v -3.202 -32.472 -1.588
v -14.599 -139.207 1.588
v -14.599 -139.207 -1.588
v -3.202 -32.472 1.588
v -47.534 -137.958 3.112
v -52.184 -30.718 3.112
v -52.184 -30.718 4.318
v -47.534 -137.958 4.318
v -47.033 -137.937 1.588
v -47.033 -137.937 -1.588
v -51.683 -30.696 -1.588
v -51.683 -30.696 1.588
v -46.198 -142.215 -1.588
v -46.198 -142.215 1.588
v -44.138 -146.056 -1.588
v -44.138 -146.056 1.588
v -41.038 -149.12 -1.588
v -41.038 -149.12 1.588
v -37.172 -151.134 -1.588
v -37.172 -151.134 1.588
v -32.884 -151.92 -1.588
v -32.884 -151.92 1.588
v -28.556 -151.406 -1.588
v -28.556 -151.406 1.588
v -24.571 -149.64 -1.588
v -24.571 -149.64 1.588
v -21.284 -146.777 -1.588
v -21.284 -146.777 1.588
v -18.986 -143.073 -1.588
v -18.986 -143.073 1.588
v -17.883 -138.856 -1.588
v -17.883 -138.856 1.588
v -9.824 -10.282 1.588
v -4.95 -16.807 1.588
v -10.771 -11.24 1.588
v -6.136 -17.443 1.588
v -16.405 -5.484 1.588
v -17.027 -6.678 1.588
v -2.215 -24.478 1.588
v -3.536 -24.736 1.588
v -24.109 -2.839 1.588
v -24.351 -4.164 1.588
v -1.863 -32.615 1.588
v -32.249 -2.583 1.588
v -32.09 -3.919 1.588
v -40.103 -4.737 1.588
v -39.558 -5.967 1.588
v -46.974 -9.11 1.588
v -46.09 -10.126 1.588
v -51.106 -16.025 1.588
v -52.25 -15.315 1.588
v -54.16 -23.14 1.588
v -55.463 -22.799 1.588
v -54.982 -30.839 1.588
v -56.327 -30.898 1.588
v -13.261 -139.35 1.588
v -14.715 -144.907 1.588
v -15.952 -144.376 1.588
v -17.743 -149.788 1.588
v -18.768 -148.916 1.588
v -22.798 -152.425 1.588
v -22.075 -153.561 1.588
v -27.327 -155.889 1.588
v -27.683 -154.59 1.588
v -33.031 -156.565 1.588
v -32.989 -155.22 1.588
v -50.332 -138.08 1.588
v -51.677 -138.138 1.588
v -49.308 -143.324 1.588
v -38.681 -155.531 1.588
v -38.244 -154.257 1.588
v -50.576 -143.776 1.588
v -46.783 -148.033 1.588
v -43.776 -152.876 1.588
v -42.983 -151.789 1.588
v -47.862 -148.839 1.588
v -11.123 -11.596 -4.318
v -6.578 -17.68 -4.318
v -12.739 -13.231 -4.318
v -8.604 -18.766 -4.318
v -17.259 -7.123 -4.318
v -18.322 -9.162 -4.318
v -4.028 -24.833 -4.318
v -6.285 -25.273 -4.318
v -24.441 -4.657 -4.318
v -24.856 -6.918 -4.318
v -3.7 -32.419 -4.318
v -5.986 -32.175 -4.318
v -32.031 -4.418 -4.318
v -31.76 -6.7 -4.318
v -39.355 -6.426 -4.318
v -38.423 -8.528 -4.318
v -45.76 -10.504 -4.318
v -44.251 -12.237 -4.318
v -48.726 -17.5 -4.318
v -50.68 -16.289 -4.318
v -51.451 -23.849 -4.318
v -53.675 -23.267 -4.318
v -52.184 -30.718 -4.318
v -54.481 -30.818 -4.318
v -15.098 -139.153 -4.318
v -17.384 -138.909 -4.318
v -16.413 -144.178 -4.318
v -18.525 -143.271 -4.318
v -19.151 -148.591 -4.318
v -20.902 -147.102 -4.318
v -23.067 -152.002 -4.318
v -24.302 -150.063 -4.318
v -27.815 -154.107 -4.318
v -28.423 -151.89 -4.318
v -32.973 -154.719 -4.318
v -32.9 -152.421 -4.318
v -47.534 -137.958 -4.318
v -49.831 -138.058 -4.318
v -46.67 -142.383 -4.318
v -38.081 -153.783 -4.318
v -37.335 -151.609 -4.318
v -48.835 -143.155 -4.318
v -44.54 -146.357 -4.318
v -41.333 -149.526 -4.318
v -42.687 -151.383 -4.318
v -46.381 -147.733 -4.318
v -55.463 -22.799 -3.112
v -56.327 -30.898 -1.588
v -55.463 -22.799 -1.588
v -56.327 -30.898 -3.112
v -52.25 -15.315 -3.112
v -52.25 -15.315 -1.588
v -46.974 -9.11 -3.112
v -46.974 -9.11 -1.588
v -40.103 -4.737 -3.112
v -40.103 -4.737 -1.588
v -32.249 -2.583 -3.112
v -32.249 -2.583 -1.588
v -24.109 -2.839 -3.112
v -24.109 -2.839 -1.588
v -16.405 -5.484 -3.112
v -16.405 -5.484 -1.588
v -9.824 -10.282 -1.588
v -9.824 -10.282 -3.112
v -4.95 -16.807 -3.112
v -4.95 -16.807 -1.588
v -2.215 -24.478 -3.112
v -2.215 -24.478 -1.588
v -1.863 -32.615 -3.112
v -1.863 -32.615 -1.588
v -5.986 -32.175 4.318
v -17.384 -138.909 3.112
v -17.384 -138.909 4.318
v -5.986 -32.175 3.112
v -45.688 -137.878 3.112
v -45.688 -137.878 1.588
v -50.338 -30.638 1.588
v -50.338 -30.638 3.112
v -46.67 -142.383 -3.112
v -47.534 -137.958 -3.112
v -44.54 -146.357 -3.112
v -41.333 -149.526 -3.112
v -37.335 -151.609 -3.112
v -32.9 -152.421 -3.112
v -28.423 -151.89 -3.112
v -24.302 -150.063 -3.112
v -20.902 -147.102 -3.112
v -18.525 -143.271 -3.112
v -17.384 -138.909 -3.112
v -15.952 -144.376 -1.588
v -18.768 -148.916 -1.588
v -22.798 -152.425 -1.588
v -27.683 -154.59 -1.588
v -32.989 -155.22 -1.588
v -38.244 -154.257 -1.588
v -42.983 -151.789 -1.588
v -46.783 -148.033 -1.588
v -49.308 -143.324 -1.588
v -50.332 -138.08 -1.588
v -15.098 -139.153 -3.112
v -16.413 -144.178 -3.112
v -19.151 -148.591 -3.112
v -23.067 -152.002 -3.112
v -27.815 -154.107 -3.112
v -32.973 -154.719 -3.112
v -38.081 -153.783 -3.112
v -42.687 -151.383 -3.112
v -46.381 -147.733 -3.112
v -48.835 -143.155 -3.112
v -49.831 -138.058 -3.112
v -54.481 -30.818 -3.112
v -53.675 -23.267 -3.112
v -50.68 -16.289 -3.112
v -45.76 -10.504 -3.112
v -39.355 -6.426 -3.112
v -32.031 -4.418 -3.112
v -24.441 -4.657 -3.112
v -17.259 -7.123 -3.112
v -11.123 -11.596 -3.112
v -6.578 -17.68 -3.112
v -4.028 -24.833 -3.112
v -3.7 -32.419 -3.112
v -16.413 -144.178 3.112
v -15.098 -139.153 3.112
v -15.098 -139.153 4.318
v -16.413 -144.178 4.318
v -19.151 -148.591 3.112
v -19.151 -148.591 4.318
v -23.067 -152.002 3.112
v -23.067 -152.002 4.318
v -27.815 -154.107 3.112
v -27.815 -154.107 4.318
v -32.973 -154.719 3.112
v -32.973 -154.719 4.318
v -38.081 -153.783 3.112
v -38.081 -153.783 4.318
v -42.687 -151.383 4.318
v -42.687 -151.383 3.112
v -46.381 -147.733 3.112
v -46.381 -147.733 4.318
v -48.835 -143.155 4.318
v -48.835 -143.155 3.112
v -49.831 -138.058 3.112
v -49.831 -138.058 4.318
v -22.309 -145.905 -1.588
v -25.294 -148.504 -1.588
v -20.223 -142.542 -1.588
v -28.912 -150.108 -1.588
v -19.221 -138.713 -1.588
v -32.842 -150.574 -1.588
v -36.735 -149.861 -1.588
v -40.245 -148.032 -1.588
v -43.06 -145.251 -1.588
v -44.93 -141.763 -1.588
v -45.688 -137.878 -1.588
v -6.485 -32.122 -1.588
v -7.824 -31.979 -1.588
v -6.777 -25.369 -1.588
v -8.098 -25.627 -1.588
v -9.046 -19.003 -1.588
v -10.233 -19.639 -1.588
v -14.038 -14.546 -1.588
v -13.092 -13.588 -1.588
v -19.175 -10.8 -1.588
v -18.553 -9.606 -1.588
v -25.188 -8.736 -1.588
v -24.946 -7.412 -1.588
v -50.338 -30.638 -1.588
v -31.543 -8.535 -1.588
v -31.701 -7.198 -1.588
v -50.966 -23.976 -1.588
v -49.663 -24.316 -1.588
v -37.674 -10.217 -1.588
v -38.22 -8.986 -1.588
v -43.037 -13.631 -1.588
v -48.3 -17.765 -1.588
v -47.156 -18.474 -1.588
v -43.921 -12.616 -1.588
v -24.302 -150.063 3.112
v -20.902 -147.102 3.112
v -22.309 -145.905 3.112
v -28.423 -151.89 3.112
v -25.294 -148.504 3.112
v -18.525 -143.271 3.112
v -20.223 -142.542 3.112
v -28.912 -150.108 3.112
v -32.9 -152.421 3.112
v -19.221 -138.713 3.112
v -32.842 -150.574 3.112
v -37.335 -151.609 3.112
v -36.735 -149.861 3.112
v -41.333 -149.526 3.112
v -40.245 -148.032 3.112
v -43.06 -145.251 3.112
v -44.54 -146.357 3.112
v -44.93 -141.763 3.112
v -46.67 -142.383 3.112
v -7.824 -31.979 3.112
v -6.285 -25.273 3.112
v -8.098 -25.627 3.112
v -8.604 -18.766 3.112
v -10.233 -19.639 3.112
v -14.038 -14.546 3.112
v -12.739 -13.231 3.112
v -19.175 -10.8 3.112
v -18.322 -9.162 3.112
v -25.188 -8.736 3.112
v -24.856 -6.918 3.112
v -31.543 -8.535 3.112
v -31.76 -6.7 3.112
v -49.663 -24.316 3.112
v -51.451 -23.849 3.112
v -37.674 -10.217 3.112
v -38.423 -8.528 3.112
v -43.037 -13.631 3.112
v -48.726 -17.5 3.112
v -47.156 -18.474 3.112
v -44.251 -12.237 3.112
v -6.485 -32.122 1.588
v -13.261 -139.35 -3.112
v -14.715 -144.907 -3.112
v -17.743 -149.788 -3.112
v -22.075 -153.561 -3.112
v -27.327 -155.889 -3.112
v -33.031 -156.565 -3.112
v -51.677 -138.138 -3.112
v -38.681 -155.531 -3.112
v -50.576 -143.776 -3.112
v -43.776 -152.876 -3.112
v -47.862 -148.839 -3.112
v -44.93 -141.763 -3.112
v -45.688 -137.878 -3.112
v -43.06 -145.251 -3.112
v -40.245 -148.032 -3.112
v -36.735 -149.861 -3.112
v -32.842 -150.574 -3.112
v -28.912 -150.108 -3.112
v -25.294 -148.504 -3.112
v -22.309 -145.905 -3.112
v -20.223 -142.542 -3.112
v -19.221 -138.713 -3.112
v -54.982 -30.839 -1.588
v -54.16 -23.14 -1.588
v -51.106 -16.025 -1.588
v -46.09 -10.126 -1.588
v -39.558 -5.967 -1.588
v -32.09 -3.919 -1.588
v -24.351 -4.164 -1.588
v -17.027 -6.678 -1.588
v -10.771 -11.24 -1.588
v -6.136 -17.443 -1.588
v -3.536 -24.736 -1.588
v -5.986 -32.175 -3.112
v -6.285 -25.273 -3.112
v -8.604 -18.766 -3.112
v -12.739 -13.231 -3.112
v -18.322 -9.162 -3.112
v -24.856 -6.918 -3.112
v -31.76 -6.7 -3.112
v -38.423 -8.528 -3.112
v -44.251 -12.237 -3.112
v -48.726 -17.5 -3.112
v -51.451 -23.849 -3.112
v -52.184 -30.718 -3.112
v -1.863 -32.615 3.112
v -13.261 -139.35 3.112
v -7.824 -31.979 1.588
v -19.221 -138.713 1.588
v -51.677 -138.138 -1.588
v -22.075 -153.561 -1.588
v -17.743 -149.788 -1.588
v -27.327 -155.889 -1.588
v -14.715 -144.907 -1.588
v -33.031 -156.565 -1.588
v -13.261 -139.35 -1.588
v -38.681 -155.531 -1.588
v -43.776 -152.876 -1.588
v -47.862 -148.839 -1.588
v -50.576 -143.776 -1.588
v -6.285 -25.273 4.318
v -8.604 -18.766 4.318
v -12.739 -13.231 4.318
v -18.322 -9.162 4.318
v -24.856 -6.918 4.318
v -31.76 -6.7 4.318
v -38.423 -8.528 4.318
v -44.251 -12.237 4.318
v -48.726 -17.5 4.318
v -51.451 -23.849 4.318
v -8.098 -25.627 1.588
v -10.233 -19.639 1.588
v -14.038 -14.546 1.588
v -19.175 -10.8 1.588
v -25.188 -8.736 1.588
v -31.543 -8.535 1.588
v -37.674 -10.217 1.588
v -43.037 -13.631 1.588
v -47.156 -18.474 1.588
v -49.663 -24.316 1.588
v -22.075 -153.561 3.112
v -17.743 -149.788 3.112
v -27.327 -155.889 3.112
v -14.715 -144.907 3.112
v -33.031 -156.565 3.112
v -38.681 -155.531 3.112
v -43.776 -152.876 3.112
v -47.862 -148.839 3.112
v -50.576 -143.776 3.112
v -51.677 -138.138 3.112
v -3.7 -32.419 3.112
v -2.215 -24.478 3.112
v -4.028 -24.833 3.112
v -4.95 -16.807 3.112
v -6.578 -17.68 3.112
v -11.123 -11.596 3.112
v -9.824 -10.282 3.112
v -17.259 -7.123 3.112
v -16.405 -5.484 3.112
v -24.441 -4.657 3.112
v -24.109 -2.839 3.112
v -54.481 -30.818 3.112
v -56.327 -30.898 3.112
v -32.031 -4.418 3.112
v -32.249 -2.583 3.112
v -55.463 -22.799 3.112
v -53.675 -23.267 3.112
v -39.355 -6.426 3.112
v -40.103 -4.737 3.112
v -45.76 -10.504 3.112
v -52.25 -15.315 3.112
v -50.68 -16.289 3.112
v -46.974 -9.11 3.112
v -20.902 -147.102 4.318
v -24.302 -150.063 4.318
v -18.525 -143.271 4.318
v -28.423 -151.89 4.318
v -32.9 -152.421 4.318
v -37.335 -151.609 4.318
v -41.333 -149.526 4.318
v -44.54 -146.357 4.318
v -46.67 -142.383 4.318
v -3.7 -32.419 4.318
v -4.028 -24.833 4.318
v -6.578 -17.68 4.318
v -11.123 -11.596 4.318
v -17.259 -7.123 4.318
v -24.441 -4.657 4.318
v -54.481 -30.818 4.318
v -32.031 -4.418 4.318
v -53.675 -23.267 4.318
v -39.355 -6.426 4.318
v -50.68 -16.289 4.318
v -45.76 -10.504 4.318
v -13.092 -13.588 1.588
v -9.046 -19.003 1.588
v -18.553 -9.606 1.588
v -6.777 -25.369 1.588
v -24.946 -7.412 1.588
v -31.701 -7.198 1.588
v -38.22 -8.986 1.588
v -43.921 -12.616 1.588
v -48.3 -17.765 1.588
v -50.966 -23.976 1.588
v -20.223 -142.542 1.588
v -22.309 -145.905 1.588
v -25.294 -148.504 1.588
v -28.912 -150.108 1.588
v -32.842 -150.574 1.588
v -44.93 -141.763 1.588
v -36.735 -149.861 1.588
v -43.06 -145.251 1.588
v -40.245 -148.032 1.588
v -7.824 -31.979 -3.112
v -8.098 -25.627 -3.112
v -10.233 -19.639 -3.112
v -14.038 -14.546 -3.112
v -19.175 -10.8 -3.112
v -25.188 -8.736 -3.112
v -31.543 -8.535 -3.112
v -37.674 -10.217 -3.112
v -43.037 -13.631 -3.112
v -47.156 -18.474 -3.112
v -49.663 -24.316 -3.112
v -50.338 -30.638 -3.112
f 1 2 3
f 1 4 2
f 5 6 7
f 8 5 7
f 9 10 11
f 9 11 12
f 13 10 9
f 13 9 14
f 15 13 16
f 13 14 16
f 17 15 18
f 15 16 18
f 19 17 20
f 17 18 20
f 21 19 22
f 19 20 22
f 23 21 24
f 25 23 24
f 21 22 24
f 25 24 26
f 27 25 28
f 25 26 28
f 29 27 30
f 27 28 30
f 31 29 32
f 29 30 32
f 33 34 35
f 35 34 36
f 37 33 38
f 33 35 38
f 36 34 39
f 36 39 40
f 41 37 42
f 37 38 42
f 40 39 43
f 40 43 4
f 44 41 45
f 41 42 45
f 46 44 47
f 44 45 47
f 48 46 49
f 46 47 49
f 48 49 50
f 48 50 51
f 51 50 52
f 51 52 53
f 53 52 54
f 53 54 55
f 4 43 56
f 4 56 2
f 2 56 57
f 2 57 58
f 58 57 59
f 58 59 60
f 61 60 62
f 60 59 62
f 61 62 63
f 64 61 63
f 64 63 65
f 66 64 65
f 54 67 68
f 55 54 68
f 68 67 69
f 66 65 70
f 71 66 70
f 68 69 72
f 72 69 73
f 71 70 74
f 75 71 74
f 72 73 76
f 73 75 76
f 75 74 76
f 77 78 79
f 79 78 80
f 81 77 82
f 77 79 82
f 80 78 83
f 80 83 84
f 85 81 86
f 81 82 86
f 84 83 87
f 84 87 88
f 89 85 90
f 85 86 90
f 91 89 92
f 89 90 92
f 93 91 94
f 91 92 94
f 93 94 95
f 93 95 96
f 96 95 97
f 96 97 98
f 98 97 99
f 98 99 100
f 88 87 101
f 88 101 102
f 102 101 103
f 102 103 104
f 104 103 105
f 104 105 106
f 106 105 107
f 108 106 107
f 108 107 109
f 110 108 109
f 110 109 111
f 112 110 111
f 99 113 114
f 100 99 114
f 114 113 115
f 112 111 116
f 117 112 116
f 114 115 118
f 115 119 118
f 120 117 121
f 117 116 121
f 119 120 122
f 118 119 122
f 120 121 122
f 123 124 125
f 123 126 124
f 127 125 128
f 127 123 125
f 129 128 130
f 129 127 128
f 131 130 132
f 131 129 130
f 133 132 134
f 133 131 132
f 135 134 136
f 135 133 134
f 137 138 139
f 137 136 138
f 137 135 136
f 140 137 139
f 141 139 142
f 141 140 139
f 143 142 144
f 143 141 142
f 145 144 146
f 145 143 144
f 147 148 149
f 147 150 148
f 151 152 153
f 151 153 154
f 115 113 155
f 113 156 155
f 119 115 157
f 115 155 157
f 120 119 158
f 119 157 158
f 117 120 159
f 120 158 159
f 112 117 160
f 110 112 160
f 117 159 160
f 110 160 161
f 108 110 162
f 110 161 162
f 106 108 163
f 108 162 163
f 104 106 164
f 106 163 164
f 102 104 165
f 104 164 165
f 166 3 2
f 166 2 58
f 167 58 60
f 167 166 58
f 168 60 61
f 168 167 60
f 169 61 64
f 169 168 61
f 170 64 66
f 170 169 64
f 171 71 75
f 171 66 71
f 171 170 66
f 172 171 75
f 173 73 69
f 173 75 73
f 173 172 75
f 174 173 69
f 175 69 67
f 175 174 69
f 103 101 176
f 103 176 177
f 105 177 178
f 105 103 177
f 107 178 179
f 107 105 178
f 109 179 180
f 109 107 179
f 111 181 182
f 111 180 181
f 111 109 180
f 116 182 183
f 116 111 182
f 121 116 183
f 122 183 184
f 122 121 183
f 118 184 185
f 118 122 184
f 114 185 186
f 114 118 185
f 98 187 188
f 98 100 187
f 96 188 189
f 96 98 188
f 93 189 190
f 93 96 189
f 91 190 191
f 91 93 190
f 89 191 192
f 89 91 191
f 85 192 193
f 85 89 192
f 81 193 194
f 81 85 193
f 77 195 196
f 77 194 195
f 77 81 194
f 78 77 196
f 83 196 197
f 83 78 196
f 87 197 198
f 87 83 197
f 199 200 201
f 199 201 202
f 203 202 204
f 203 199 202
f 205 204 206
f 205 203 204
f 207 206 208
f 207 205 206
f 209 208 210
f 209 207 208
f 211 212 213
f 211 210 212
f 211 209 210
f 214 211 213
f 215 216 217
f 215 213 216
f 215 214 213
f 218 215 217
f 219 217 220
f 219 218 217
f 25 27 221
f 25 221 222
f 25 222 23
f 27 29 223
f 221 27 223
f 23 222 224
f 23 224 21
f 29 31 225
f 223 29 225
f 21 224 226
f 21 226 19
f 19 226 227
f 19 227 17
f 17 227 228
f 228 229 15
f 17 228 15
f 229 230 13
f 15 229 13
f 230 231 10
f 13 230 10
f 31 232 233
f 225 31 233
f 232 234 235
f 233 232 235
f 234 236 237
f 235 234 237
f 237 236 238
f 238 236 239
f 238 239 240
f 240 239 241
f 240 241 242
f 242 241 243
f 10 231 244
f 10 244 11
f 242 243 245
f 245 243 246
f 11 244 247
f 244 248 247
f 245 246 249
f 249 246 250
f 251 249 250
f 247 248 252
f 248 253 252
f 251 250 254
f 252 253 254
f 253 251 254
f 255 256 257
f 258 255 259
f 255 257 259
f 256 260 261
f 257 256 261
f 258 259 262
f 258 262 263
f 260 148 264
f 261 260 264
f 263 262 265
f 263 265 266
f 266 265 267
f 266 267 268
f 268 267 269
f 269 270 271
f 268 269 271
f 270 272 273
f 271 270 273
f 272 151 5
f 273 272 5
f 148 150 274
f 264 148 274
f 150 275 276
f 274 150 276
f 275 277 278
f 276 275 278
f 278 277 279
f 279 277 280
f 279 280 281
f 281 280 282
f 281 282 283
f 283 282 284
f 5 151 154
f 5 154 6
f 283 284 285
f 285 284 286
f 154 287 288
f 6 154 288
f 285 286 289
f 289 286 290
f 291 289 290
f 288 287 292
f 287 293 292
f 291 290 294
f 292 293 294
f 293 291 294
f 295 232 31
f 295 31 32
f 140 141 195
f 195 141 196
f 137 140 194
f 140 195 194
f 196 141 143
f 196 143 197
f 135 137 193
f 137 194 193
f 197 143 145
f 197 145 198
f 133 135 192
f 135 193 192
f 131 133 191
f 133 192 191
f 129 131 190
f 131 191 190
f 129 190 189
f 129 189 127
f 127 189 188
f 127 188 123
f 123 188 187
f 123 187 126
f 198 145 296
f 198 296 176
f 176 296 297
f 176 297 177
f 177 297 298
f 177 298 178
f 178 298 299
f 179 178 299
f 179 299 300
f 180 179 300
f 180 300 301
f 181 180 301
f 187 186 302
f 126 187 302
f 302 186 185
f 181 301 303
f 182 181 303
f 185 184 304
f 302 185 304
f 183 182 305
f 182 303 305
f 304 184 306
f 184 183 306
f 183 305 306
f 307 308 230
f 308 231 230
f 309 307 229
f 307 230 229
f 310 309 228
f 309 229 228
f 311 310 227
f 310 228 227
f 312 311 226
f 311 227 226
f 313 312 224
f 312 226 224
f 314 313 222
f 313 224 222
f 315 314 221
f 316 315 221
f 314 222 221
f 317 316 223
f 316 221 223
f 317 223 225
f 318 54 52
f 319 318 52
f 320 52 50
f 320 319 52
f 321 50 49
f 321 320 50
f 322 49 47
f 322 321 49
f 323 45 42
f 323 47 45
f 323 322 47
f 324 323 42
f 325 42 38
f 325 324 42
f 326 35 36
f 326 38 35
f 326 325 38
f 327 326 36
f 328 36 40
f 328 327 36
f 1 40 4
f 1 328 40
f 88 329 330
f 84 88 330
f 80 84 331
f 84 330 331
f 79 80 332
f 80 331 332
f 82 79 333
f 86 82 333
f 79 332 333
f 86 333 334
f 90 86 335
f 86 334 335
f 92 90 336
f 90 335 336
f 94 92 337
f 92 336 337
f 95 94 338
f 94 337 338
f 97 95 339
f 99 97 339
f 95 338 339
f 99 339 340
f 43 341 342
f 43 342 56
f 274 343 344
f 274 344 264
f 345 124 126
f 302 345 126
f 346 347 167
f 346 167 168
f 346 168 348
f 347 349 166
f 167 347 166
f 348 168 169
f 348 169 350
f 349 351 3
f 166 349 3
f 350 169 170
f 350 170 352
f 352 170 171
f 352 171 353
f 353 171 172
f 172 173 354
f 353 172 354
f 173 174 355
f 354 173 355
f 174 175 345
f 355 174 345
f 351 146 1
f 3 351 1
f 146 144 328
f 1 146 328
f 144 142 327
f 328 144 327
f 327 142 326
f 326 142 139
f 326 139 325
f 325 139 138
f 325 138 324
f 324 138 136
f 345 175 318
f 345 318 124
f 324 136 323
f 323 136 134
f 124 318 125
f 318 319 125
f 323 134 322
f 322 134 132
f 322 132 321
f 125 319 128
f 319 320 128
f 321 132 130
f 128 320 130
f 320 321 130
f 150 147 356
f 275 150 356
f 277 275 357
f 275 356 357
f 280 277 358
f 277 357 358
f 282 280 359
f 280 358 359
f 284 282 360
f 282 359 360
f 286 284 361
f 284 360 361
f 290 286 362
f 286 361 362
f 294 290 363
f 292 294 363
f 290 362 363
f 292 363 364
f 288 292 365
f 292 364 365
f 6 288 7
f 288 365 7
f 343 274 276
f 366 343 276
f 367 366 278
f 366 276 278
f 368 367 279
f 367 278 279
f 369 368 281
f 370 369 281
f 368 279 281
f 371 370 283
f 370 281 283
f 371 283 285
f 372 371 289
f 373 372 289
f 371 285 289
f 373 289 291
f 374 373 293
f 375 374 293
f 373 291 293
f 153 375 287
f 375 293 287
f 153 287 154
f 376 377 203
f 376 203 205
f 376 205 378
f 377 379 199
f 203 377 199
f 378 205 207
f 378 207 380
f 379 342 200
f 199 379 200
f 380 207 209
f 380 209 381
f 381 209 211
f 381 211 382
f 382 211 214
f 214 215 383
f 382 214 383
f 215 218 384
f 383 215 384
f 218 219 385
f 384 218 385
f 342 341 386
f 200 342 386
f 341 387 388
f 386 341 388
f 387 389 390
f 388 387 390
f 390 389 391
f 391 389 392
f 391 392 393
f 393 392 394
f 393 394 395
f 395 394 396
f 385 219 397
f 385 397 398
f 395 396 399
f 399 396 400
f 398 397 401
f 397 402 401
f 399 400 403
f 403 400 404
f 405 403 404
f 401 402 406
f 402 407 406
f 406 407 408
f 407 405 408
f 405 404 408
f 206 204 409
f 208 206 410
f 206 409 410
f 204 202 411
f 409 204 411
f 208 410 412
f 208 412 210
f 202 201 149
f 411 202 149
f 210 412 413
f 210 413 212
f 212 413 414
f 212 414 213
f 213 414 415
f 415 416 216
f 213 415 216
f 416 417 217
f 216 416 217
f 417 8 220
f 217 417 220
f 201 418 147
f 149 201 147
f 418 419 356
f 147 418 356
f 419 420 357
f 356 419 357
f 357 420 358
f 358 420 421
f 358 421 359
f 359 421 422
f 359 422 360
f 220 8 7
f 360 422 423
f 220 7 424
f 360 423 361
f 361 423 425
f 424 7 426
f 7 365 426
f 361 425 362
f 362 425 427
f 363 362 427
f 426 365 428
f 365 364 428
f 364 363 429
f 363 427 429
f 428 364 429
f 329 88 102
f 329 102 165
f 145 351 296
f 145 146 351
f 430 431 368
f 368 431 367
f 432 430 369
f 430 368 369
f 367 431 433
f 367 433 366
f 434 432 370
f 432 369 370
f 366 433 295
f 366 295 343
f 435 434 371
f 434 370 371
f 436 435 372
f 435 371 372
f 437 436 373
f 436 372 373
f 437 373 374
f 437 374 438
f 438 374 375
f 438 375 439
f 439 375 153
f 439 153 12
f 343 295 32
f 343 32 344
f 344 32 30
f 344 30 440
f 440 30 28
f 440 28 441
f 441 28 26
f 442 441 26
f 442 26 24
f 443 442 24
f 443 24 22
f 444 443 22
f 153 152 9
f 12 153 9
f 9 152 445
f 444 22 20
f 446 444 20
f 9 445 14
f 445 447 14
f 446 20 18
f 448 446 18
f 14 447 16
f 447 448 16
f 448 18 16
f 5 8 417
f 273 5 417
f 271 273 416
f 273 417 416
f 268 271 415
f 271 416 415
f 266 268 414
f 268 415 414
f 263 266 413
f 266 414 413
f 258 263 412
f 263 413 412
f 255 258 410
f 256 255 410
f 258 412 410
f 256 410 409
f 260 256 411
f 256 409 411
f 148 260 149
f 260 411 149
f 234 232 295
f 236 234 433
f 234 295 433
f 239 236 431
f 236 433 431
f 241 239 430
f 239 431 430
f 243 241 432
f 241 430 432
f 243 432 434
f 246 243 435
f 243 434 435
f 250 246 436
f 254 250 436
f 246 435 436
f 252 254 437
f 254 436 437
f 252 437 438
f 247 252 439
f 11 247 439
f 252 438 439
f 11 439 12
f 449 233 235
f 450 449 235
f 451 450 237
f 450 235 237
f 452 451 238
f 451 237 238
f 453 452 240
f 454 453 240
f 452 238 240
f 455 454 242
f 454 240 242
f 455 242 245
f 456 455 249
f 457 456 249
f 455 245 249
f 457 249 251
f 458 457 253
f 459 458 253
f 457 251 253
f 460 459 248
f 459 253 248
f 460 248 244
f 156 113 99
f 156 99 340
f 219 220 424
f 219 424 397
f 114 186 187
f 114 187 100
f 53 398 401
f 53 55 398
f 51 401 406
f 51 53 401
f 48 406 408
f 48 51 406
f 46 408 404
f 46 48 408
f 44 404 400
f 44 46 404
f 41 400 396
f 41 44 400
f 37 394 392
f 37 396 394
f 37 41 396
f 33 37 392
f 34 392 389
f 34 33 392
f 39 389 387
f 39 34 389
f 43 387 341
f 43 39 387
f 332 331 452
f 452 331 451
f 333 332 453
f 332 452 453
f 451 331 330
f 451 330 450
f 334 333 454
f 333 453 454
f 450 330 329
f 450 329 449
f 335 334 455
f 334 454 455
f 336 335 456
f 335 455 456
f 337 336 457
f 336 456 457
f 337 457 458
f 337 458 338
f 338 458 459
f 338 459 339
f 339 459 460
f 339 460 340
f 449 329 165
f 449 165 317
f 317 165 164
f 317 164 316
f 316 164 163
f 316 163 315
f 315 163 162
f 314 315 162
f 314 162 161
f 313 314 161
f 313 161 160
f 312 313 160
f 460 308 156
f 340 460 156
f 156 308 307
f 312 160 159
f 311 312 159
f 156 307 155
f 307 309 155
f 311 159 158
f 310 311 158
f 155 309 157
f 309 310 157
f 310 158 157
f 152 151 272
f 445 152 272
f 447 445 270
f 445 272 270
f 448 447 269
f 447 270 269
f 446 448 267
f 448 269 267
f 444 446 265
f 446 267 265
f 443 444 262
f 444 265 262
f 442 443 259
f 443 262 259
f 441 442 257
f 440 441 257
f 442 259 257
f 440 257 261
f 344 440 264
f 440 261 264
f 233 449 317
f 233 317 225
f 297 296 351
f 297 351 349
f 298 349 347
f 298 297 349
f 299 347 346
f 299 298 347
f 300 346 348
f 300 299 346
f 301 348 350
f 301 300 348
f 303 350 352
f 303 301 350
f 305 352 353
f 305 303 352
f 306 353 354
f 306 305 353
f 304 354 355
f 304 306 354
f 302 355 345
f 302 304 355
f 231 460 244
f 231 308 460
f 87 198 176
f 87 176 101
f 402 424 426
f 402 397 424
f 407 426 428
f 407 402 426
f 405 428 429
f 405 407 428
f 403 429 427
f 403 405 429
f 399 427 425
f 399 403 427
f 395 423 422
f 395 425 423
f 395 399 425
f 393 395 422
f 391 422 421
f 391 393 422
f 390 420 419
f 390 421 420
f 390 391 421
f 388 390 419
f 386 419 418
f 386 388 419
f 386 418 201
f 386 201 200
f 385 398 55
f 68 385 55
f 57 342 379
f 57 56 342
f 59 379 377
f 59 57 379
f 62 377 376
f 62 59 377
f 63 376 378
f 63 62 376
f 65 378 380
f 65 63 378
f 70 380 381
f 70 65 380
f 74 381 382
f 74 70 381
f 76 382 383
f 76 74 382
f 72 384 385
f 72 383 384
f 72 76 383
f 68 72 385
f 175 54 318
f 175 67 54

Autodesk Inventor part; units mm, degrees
ref_plane "РабПлоскость2" through (-29.0304, -29.7142, 0) normal (-1, 0, 0) x (0, 0, 1)
ref_plane "РабПлоскость3" through (-32.4235, -137.3033, 0) normal (0.367917, 0.9298586, 0) x (0, 0, 1)
sketch "Траектория" plane through (0, 0, 0) normal (0, 0, 1) x (1, 0, 0)
  arc A0 (-4.8433, -32.2971) -> (-53.3322, -30.7678) centre (-29.0304, -29.7142) ccw
  arc A1 (-48.6827, -138.0082) -> (-16.241, -139.0313) centre (-32.4235, -137.3033) ccw
  line L0 (-48.6827, -138.0082) -> (-53.3322, -30.7678)
  line L1 (-4.8433, -32.2971) -> (-16.241, -139.0313)
ref_plane "Секущая плоскость" through (-53.3322, -30.7678, 0) normal (0.0433145, -0.9990615, 0) x (0, 0, 1)
sketch "Эскиз сечения" plane through (-53.3322, -30.7678, 0) normal (0.0433145, -0.9990615, 0) x (0, 0, 1)
  line L0 (-4.318, -1.1494) -> (4.318, -1.1494)
  line L1 (4.318, -1.1494) -> (4.318, 1.1494)
  line L2 (4.318, 1.1494) -> (-4.318, 1.1494)
  line L3 (-4.318, 1.1494) -> (-4.318, -1.1494)
  line L4 (-1.5875, -1.651) -> (1.5875, -1.651)
  line L5 (1.5875, -1.651) -> (1.5875, 1.651)
  line L6 (1.5875, 1.651) -> (-1.5875, 1.651)
  line L7 (-1.5875, 1.651) -> (-1.5875, -1.651)
  line L8 (-1.5875, 0) -> (1.5875, 0) construction
  line L9 (-3.1115, -2.9972) -> (-1.5875, -2.9972)
  line L10 (-1.5875, -2.9972) -> (-1.5875, 2.9972)
  line L11 (-1.5875, 2.9972) -> (-3.1115, 2.9972)
  line L12 (-3.1115, 2.9972) -> (-3.1115, -2.9972)
  line L13 (1.5875, -2.9972) -> (3.1115, -2.9972)
  line L14 (3.1115, -2.9972) -> (3.1115, 2.9972)
  line L15 (3.1115, 2.9972) -> (1.5875, 2.9972)
  line L16 (1.5875, 2.9972) -> (1.5875, -2.9972)
  line L17 (-4.318, 0) -> (4.318, 0) construction
  point P0 (0, 0)
  point P1 (0, 0)
  dimension "d21" = 2.2987
  dimension "d22" = 3.302
  dimension "d23" = 3.175
  dimension "d24" = 1.524
  dimension "d31" = 5.9944
  dimension "d32" = 8.636
sweep "Тело" add profiles "Эскиз сечения" path "Траектория"
pattern_of_one "Strand Pattern"
equation "\"d21\" = da_d2"
equation "\"d22\" = da_d1"
equation "\"d23\" = da_b1"
equation "\"d24\" = da_t1 + da_t2"
equation "\"d30\" = da_pt"
equation "\"da_p\" = 6.35"
equation "\"da_b1\" = 3.175"
equation "\"da_h2\" = 5.9944"
equation "\"da_h3\" = 5.207"
equation "\"da_d1\" = 3.302"
equation "\"da_d2\" = 2.2987"
equation "\"da_pt\" = 6.4008"
equation "\"da_b\" = 8.636"
equation "\"da_t1\" = 0.762"
equation "\"da_t2\" = 0.762"
properties part number "Цепь роликовая" material "Сталь, мягкая"
